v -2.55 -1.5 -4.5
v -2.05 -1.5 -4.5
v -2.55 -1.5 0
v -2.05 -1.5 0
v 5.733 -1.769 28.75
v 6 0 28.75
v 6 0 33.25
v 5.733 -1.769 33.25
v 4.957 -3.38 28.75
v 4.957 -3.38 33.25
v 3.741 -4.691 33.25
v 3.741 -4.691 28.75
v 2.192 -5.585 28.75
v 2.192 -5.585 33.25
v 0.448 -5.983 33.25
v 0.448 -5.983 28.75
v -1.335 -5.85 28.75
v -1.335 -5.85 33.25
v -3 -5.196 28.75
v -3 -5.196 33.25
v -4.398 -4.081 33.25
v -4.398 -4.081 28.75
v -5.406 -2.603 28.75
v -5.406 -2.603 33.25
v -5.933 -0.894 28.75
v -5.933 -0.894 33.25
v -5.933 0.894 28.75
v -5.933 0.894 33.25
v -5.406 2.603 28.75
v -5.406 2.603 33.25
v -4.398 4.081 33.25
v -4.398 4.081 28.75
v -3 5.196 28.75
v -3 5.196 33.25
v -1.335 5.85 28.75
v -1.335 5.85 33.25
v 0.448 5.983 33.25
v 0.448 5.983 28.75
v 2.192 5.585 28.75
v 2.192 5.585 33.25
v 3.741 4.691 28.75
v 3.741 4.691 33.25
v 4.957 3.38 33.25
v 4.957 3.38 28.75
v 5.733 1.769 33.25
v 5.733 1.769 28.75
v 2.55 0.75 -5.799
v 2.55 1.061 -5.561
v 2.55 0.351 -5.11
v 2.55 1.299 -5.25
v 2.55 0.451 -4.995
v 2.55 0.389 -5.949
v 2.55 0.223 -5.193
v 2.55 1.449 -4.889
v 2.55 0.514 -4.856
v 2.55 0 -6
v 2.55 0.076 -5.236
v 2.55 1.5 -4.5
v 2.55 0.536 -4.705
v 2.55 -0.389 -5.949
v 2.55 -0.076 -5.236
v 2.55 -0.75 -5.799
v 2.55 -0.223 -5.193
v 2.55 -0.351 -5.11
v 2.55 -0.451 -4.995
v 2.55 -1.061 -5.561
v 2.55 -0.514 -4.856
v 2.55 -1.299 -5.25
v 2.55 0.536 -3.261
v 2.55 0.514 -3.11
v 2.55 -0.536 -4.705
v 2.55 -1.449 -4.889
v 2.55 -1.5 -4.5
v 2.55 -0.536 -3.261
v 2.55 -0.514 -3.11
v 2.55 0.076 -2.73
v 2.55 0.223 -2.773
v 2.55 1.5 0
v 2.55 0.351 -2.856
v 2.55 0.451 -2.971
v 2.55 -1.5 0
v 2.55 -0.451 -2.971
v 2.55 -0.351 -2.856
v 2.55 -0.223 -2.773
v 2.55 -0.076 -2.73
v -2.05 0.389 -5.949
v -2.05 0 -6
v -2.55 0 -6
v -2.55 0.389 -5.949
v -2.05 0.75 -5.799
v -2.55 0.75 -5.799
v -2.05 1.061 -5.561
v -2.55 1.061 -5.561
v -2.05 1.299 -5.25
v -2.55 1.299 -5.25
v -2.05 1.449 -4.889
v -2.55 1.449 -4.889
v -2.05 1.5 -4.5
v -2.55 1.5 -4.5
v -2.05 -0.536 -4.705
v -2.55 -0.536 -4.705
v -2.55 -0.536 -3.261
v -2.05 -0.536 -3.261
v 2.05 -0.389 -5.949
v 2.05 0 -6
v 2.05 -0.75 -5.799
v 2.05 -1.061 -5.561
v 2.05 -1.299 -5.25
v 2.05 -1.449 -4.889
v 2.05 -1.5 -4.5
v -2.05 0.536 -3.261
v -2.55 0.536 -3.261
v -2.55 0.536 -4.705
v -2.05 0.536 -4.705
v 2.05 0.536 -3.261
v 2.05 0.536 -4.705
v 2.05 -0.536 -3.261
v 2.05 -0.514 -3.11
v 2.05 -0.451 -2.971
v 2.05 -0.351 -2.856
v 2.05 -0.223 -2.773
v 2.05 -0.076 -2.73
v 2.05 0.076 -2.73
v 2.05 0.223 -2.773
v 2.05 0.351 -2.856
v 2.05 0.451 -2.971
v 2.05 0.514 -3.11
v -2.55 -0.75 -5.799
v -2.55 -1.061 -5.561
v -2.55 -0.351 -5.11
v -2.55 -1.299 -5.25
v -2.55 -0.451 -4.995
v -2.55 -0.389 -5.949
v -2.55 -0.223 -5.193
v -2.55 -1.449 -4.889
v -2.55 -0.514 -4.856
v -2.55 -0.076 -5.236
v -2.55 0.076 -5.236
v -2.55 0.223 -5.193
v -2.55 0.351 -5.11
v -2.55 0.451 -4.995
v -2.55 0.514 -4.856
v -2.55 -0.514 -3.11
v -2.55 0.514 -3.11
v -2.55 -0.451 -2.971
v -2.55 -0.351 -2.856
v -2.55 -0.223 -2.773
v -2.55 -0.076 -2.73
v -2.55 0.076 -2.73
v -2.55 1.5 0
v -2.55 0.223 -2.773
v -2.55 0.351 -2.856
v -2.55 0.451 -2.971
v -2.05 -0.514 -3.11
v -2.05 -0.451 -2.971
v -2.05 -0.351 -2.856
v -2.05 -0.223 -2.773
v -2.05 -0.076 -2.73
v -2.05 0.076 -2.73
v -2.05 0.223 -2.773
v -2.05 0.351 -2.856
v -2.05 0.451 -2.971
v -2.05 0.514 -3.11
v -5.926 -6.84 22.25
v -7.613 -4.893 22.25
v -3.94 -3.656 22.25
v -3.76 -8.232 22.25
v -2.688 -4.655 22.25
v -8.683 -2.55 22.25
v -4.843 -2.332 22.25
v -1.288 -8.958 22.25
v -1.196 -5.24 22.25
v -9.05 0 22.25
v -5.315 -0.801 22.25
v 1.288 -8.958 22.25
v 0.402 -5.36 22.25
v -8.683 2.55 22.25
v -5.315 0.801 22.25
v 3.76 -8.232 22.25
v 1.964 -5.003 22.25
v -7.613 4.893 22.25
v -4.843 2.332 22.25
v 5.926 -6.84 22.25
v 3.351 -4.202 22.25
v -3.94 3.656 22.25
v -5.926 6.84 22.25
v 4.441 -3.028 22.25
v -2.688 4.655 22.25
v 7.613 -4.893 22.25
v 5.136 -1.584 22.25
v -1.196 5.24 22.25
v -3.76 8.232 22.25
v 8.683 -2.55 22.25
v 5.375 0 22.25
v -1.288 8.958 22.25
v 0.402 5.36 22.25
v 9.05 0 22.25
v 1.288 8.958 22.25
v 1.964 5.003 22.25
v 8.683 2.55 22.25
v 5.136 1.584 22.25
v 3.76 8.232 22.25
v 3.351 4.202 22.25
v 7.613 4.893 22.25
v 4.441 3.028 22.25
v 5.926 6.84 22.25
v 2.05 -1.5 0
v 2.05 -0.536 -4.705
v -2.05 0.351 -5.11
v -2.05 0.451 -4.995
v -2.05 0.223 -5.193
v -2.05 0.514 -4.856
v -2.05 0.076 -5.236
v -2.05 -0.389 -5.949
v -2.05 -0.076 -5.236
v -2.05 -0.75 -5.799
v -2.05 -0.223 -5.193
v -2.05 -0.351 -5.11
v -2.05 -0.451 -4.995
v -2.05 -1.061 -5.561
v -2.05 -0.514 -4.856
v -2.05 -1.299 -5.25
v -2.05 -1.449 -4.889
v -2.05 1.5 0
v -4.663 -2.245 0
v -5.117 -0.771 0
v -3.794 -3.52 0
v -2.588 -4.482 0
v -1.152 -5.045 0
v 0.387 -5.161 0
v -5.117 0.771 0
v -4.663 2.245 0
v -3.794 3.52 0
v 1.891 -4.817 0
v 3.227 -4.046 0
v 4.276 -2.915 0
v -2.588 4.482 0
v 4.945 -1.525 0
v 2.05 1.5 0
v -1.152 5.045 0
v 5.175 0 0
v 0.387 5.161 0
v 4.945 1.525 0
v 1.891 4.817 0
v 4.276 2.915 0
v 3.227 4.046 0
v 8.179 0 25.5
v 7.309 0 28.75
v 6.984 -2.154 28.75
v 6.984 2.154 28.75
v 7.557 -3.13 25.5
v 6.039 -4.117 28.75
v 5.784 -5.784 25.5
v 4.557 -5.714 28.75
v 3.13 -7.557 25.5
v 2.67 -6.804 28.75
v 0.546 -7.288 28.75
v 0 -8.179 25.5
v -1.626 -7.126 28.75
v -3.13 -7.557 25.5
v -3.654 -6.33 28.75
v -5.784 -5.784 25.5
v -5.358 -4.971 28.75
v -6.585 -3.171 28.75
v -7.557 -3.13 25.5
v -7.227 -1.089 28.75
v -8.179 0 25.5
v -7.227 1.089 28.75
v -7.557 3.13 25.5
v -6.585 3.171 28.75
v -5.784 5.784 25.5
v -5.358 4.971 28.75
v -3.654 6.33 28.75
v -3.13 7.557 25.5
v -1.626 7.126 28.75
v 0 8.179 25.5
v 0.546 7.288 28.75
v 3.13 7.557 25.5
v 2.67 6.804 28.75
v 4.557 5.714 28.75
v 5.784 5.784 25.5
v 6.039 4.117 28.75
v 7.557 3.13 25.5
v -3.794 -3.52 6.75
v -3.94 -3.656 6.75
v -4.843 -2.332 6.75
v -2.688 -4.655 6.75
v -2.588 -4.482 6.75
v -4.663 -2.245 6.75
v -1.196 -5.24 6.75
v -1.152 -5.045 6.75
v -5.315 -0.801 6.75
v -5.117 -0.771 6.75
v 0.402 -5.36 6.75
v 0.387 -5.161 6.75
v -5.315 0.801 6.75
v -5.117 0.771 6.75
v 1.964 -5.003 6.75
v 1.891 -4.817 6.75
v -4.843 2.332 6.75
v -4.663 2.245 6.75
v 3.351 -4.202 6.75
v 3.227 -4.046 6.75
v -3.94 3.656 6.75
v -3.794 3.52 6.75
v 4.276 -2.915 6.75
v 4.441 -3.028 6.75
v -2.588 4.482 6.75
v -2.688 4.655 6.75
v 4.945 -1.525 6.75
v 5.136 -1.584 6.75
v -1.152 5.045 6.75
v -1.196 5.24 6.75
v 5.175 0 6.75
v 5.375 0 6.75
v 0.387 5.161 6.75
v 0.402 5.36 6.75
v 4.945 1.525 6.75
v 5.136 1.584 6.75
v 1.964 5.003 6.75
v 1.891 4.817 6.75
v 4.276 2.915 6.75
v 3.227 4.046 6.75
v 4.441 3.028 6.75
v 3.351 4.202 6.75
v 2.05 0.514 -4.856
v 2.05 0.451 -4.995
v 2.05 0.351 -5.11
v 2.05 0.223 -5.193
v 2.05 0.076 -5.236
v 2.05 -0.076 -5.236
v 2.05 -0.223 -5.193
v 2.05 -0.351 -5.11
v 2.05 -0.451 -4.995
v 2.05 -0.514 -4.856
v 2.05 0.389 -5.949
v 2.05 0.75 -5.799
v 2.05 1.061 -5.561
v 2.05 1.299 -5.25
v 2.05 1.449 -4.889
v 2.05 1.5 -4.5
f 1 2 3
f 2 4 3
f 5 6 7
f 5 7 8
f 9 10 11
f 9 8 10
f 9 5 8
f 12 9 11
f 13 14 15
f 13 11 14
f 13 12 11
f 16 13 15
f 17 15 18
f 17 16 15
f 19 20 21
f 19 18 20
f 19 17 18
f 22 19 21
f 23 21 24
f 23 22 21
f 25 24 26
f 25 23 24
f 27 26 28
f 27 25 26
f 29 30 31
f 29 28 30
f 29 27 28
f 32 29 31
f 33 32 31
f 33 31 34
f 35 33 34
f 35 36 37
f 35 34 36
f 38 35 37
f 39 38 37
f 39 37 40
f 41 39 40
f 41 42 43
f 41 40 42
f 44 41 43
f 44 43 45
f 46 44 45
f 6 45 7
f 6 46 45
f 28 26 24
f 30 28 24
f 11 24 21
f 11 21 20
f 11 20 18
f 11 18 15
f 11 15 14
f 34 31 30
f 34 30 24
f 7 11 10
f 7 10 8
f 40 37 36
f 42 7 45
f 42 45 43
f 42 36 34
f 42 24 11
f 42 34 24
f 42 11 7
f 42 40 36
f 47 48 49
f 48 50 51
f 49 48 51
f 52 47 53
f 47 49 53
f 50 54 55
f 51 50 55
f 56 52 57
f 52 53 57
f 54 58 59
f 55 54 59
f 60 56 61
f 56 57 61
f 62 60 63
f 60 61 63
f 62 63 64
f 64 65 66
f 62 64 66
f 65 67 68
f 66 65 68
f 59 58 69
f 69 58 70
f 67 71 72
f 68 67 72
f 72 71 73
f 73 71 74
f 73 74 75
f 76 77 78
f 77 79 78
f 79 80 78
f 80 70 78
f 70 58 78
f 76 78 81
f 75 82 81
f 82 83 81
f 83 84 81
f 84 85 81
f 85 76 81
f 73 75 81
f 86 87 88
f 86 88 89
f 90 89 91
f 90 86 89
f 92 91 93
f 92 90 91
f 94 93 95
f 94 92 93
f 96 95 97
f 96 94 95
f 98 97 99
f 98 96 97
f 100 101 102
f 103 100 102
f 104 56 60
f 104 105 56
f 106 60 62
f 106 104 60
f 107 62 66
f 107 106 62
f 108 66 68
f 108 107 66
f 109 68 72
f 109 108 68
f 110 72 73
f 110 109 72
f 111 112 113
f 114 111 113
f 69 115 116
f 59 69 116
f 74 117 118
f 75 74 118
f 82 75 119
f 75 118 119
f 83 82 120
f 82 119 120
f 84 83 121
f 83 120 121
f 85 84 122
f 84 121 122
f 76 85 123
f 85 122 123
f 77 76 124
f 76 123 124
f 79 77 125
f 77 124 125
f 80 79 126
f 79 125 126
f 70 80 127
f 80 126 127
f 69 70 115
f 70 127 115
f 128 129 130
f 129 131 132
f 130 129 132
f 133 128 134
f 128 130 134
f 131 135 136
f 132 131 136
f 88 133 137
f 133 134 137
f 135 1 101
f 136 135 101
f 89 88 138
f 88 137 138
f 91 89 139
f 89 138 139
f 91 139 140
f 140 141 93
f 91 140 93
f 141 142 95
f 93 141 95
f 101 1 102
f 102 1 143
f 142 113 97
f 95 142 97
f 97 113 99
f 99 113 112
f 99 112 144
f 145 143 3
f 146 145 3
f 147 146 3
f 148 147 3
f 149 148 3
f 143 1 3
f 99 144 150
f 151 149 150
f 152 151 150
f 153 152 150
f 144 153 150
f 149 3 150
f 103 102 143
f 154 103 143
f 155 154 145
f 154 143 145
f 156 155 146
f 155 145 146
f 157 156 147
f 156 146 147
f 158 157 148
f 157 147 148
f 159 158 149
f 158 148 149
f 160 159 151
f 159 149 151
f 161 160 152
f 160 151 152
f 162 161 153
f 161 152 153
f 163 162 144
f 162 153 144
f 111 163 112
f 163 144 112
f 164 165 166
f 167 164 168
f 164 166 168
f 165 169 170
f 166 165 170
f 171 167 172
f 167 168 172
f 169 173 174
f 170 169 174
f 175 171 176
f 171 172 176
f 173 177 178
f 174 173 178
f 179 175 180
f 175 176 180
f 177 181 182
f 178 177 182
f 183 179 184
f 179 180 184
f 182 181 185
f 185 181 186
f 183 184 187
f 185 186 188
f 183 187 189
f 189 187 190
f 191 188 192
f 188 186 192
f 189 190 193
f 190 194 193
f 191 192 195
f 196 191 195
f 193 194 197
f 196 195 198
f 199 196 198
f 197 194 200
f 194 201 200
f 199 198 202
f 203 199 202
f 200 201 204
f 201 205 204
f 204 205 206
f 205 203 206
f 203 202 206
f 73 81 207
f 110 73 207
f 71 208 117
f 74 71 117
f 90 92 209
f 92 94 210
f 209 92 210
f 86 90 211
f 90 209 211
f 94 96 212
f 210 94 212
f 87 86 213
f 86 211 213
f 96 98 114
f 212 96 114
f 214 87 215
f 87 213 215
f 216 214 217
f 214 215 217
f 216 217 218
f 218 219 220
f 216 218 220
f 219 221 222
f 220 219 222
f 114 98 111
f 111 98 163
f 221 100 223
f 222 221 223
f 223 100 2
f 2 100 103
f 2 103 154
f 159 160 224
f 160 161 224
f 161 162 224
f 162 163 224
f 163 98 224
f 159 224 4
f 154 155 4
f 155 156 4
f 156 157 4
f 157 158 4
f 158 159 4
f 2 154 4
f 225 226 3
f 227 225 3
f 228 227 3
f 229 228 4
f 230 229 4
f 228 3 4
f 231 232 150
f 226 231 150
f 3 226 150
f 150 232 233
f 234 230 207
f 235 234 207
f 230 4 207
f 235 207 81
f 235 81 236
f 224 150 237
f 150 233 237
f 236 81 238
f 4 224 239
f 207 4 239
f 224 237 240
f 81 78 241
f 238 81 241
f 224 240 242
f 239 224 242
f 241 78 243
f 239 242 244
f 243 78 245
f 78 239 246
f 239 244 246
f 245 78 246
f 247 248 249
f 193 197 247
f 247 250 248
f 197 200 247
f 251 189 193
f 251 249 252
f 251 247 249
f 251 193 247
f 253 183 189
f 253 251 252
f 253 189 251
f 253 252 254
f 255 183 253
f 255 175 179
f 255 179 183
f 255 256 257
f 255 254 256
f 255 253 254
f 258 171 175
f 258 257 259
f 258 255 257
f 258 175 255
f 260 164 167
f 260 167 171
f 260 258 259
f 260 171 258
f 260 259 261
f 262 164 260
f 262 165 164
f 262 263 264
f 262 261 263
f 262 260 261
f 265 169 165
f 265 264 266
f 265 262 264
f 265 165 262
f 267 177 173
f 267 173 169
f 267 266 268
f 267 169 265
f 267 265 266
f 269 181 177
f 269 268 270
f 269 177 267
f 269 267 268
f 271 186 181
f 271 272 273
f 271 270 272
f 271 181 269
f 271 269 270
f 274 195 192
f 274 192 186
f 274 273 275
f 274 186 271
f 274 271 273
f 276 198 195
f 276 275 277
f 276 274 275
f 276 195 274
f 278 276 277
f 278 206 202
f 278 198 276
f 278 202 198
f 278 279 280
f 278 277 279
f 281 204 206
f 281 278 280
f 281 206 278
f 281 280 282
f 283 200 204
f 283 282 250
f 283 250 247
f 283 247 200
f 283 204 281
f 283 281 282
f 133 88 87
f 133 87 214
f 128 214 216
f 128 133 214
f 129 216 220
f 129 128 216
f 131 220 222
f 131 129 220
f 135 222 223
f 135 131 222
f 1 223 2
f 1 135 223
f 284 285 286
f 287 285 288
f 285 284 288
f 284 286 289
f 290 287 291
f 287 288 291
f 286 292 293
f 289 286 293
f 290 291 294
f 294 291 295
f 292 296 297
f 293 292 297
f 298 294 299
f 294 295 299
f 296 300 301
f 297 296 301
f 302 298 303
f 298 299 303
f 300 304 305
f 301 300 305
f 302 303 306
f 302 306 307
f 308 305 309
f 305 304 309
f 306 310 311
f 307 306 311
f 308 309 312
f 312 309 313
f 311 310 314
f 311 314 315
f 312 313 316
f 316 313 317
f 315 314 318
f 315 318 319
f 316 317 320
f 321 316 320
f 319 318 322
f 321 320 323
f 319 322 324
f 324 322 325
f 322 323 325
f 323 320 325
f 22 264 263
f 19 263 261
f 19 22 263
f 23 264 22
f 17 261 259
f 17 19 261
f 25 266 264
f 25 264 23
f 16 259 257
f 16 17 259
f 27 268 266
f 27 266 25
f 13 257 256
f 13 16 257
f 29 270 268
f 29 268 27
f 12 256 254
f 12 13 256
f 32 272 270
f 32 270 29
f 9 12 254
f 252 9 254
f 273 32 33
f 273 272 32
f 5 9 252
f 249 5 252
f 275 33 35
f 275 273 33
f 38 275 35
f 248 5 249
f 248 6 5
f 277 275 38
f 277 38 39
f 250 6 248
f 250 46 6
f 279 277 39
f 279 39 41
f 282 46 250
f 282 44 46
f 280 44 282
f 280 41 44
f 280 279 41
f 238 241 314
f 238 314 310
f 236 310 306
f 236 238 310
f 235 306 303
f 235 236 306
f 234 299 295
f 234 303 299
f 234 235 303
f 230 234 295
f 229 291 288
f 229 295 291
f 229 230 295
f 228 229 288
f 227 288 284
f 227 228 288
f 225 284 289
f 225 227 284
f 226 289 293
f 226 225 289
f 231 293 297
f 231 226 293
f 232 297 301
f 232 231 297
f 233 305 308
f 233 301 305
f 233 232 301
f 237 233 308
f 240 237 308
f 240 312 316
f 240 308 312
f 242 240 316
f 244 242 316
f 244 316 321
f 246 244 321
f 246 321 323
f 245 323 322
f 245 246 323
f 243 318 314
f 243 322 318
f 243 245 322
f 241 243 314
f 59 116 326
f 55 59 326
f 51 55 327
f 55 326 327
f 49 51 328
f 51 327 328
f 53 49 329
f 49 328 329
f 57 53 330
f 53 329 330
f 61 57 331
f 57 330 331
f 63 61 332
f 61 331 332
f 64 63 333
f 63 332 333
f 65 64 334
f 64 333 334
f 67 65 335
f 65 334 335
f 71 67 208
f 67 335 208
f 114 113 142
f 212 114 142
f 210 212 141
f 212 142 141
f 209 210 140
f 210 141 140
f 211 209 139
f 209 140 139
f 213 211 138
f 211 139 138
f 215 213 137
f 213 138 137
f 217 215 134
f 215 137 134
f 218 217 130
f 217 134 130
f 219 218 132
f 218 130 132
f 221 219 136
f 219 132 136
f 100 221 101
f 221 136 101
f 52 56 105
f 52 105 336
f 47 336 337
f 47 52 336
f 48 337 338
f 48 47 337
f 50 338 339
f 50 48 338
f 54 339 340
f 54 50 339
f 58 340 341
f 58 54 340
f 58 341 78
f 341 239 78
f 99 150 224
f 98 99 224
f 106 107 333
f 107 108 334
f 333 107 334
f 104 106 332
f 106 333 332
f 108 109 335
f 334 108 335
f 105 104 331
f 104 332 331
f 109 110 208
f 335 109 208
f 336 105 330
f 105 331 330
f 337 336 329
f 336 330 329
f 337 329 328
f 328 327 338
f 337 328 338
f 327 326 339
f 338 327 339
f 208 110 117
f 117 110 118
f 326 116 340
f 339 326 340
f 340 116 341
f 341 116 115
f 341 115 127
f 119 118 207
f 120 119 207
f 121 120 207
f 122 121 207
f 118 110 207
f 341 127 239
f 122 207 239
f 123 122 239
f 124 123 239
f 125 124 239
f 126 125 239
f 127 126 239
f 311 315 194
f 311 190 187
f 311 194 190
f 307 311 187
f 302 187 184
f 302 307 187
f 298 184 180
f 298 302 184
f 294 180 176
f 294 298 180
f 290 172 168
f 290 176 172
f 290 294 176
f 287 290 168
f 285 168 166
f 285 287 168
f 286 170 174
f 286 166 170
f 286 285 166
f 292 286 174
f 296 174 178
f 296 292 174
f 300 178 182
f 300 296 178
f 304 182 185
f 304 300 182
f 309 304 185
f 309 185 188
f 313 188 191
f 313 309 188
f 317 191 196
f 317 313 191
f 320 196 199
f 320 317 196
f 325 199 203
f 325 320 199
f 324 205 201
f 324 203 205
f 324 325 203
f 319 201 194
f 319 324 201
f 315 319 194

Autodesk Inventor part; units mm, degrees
ref_plane "YZ Plane" through (0, 0, 0) normal (1, 0, 0) x (0, 1, 0)
ref_plane "XZ Plane" through (0, 0, 0) normal (0, 1, 0) x (-1, 0, 0)
ref_plane "XY Plane" through (0, 0, 0) normal (0, 0, 1) x (1, 0, 0)
sketch "Sketch1" plane through (0, 0, 0) normal (0, 0, 1) x (1, 0, 0)
  circle A0 centre (0, 0) radius 5.175
  dimension "d0" = 10.35
extrude "Extrusion1" add sketch "Sketch1" along normal blind 6.75
sketch "Sketch2" plane through (0, 0, 6.75) normal (0, 0, 1) x (1, 0, 0)
  circle A0 centre (0, 0) radius 5.375
  dimension "d3" = 10.75
extrude "Extrusion2" add sketch "Sketch2" along normal blind 15.5
sketch "Sketch3" plane through (0, 0, 22.25) normal (0, 0, 1) x (1, 0, 0)
  circle A0 centre (0, 0) radius 9.05
  dimension "d6" = 18.1
extrude "Extrusion3" add sketch "Sketch3" along normal blind 6.5
chamfer "Chamfer1" distance 6.5 angle 15 1 edges at (-9.05, 0, 28.75) measured on face at (8.9328, -1.4517, 26.5833)
sketch "Sketch4" plane through (0, 0, 0) normal (0, 0, -1) x (-1, 0, 0)
  circle A0 centre (0, 0) radius 5.175 projected
  line L0 (2.55, 1.5) -> (2.05, 1.5)
  line L1 (2.05, 1.5) -> (2.05, -1.5)
  line L2 (2.05, -1.5) -> (2.55, -1.5)
  line L3 (2.55, -1.5) -> (2.55, 1.5)
  line L4 (-2.05, 1.5) -> (-2.55, 1.5)
  line L5 (-2.55, 1.5) -> (-2.55, -1.5)
  line L6 (-2.55, -1.5) -> (-2.05, -1.5)
  line L7 (-2.05, -1.5) -> (-2.05, 1.5)
  dimension "d12" = 0.5
  dimension "d13" = 3
  dimension "d14" = 0.5
  dimension "d15" = 3
  dimension "d16" = 5.1
  dimension "d17" = 2.625
  dimension "d18" = 2.625
  dimension "d19" = 3.675
  dimension "d20" = 3.675
extrude "Extrusion4" add sketch "Sketch4" along normal blind 6 contours L3 L2 L1 L0 | L7 L6 L5 L4
fillet "Fillet1" radius 1.5 4 edges at (-2.3, 1.5, -6) (-2.3, -1.5, -6) (2.3, 1.5, -6) (2.3, -1.5, -6)
sketch "Sketch5" plane through (-2.55, -1.5, 0) normal (-1, 0, 0) x (0, 0, 1)
  line L0 (-4.7053, 1.5) -> (-3.2606, 1.5) construction
  line L1 (-4.7053, 0.9641) -> (-3.2606, 0.9641)
  line L2 (-3.2606, 2.0359) -> (-4.7053, 2.0359)
  arc A0 (-4.7053, 2.0359) -> (-4.7053, 0.9641) centre (-4.7053, 1.5) ccw
  arc A1 (-3.2606, 0.9641) -> (-3.2606, 2.0359) centre (-3.2606, 1.5) ccw
  line L3 (0, 0) -> (-4.5, 0) projected
  line L4 (0, 3) -> (-4.5, 3) projected
  point P0 (0, 1.5)
  point P1 (-3.983, 1.5)
  dimension "d24" = 1.5
  dimension "d25" = 1.5
extrude "Extrusion5" cut sketch "Sketch5" against normal through all
sketch "Sketch6" plane through (0, 0, 28.75) normal (0, 0, 1) x (1, 0, 0)
  circle A0 centre (0, 0) radius 6
  dimension "d28" = 12
extrude "Extrusion6" add sketch "Sketch6" along normal blind 4.5
equation "\"d17\" = d18"
equation "\"d19\" = d20"
equation "\"d24\" = d25"
properties part number "przycisk"
